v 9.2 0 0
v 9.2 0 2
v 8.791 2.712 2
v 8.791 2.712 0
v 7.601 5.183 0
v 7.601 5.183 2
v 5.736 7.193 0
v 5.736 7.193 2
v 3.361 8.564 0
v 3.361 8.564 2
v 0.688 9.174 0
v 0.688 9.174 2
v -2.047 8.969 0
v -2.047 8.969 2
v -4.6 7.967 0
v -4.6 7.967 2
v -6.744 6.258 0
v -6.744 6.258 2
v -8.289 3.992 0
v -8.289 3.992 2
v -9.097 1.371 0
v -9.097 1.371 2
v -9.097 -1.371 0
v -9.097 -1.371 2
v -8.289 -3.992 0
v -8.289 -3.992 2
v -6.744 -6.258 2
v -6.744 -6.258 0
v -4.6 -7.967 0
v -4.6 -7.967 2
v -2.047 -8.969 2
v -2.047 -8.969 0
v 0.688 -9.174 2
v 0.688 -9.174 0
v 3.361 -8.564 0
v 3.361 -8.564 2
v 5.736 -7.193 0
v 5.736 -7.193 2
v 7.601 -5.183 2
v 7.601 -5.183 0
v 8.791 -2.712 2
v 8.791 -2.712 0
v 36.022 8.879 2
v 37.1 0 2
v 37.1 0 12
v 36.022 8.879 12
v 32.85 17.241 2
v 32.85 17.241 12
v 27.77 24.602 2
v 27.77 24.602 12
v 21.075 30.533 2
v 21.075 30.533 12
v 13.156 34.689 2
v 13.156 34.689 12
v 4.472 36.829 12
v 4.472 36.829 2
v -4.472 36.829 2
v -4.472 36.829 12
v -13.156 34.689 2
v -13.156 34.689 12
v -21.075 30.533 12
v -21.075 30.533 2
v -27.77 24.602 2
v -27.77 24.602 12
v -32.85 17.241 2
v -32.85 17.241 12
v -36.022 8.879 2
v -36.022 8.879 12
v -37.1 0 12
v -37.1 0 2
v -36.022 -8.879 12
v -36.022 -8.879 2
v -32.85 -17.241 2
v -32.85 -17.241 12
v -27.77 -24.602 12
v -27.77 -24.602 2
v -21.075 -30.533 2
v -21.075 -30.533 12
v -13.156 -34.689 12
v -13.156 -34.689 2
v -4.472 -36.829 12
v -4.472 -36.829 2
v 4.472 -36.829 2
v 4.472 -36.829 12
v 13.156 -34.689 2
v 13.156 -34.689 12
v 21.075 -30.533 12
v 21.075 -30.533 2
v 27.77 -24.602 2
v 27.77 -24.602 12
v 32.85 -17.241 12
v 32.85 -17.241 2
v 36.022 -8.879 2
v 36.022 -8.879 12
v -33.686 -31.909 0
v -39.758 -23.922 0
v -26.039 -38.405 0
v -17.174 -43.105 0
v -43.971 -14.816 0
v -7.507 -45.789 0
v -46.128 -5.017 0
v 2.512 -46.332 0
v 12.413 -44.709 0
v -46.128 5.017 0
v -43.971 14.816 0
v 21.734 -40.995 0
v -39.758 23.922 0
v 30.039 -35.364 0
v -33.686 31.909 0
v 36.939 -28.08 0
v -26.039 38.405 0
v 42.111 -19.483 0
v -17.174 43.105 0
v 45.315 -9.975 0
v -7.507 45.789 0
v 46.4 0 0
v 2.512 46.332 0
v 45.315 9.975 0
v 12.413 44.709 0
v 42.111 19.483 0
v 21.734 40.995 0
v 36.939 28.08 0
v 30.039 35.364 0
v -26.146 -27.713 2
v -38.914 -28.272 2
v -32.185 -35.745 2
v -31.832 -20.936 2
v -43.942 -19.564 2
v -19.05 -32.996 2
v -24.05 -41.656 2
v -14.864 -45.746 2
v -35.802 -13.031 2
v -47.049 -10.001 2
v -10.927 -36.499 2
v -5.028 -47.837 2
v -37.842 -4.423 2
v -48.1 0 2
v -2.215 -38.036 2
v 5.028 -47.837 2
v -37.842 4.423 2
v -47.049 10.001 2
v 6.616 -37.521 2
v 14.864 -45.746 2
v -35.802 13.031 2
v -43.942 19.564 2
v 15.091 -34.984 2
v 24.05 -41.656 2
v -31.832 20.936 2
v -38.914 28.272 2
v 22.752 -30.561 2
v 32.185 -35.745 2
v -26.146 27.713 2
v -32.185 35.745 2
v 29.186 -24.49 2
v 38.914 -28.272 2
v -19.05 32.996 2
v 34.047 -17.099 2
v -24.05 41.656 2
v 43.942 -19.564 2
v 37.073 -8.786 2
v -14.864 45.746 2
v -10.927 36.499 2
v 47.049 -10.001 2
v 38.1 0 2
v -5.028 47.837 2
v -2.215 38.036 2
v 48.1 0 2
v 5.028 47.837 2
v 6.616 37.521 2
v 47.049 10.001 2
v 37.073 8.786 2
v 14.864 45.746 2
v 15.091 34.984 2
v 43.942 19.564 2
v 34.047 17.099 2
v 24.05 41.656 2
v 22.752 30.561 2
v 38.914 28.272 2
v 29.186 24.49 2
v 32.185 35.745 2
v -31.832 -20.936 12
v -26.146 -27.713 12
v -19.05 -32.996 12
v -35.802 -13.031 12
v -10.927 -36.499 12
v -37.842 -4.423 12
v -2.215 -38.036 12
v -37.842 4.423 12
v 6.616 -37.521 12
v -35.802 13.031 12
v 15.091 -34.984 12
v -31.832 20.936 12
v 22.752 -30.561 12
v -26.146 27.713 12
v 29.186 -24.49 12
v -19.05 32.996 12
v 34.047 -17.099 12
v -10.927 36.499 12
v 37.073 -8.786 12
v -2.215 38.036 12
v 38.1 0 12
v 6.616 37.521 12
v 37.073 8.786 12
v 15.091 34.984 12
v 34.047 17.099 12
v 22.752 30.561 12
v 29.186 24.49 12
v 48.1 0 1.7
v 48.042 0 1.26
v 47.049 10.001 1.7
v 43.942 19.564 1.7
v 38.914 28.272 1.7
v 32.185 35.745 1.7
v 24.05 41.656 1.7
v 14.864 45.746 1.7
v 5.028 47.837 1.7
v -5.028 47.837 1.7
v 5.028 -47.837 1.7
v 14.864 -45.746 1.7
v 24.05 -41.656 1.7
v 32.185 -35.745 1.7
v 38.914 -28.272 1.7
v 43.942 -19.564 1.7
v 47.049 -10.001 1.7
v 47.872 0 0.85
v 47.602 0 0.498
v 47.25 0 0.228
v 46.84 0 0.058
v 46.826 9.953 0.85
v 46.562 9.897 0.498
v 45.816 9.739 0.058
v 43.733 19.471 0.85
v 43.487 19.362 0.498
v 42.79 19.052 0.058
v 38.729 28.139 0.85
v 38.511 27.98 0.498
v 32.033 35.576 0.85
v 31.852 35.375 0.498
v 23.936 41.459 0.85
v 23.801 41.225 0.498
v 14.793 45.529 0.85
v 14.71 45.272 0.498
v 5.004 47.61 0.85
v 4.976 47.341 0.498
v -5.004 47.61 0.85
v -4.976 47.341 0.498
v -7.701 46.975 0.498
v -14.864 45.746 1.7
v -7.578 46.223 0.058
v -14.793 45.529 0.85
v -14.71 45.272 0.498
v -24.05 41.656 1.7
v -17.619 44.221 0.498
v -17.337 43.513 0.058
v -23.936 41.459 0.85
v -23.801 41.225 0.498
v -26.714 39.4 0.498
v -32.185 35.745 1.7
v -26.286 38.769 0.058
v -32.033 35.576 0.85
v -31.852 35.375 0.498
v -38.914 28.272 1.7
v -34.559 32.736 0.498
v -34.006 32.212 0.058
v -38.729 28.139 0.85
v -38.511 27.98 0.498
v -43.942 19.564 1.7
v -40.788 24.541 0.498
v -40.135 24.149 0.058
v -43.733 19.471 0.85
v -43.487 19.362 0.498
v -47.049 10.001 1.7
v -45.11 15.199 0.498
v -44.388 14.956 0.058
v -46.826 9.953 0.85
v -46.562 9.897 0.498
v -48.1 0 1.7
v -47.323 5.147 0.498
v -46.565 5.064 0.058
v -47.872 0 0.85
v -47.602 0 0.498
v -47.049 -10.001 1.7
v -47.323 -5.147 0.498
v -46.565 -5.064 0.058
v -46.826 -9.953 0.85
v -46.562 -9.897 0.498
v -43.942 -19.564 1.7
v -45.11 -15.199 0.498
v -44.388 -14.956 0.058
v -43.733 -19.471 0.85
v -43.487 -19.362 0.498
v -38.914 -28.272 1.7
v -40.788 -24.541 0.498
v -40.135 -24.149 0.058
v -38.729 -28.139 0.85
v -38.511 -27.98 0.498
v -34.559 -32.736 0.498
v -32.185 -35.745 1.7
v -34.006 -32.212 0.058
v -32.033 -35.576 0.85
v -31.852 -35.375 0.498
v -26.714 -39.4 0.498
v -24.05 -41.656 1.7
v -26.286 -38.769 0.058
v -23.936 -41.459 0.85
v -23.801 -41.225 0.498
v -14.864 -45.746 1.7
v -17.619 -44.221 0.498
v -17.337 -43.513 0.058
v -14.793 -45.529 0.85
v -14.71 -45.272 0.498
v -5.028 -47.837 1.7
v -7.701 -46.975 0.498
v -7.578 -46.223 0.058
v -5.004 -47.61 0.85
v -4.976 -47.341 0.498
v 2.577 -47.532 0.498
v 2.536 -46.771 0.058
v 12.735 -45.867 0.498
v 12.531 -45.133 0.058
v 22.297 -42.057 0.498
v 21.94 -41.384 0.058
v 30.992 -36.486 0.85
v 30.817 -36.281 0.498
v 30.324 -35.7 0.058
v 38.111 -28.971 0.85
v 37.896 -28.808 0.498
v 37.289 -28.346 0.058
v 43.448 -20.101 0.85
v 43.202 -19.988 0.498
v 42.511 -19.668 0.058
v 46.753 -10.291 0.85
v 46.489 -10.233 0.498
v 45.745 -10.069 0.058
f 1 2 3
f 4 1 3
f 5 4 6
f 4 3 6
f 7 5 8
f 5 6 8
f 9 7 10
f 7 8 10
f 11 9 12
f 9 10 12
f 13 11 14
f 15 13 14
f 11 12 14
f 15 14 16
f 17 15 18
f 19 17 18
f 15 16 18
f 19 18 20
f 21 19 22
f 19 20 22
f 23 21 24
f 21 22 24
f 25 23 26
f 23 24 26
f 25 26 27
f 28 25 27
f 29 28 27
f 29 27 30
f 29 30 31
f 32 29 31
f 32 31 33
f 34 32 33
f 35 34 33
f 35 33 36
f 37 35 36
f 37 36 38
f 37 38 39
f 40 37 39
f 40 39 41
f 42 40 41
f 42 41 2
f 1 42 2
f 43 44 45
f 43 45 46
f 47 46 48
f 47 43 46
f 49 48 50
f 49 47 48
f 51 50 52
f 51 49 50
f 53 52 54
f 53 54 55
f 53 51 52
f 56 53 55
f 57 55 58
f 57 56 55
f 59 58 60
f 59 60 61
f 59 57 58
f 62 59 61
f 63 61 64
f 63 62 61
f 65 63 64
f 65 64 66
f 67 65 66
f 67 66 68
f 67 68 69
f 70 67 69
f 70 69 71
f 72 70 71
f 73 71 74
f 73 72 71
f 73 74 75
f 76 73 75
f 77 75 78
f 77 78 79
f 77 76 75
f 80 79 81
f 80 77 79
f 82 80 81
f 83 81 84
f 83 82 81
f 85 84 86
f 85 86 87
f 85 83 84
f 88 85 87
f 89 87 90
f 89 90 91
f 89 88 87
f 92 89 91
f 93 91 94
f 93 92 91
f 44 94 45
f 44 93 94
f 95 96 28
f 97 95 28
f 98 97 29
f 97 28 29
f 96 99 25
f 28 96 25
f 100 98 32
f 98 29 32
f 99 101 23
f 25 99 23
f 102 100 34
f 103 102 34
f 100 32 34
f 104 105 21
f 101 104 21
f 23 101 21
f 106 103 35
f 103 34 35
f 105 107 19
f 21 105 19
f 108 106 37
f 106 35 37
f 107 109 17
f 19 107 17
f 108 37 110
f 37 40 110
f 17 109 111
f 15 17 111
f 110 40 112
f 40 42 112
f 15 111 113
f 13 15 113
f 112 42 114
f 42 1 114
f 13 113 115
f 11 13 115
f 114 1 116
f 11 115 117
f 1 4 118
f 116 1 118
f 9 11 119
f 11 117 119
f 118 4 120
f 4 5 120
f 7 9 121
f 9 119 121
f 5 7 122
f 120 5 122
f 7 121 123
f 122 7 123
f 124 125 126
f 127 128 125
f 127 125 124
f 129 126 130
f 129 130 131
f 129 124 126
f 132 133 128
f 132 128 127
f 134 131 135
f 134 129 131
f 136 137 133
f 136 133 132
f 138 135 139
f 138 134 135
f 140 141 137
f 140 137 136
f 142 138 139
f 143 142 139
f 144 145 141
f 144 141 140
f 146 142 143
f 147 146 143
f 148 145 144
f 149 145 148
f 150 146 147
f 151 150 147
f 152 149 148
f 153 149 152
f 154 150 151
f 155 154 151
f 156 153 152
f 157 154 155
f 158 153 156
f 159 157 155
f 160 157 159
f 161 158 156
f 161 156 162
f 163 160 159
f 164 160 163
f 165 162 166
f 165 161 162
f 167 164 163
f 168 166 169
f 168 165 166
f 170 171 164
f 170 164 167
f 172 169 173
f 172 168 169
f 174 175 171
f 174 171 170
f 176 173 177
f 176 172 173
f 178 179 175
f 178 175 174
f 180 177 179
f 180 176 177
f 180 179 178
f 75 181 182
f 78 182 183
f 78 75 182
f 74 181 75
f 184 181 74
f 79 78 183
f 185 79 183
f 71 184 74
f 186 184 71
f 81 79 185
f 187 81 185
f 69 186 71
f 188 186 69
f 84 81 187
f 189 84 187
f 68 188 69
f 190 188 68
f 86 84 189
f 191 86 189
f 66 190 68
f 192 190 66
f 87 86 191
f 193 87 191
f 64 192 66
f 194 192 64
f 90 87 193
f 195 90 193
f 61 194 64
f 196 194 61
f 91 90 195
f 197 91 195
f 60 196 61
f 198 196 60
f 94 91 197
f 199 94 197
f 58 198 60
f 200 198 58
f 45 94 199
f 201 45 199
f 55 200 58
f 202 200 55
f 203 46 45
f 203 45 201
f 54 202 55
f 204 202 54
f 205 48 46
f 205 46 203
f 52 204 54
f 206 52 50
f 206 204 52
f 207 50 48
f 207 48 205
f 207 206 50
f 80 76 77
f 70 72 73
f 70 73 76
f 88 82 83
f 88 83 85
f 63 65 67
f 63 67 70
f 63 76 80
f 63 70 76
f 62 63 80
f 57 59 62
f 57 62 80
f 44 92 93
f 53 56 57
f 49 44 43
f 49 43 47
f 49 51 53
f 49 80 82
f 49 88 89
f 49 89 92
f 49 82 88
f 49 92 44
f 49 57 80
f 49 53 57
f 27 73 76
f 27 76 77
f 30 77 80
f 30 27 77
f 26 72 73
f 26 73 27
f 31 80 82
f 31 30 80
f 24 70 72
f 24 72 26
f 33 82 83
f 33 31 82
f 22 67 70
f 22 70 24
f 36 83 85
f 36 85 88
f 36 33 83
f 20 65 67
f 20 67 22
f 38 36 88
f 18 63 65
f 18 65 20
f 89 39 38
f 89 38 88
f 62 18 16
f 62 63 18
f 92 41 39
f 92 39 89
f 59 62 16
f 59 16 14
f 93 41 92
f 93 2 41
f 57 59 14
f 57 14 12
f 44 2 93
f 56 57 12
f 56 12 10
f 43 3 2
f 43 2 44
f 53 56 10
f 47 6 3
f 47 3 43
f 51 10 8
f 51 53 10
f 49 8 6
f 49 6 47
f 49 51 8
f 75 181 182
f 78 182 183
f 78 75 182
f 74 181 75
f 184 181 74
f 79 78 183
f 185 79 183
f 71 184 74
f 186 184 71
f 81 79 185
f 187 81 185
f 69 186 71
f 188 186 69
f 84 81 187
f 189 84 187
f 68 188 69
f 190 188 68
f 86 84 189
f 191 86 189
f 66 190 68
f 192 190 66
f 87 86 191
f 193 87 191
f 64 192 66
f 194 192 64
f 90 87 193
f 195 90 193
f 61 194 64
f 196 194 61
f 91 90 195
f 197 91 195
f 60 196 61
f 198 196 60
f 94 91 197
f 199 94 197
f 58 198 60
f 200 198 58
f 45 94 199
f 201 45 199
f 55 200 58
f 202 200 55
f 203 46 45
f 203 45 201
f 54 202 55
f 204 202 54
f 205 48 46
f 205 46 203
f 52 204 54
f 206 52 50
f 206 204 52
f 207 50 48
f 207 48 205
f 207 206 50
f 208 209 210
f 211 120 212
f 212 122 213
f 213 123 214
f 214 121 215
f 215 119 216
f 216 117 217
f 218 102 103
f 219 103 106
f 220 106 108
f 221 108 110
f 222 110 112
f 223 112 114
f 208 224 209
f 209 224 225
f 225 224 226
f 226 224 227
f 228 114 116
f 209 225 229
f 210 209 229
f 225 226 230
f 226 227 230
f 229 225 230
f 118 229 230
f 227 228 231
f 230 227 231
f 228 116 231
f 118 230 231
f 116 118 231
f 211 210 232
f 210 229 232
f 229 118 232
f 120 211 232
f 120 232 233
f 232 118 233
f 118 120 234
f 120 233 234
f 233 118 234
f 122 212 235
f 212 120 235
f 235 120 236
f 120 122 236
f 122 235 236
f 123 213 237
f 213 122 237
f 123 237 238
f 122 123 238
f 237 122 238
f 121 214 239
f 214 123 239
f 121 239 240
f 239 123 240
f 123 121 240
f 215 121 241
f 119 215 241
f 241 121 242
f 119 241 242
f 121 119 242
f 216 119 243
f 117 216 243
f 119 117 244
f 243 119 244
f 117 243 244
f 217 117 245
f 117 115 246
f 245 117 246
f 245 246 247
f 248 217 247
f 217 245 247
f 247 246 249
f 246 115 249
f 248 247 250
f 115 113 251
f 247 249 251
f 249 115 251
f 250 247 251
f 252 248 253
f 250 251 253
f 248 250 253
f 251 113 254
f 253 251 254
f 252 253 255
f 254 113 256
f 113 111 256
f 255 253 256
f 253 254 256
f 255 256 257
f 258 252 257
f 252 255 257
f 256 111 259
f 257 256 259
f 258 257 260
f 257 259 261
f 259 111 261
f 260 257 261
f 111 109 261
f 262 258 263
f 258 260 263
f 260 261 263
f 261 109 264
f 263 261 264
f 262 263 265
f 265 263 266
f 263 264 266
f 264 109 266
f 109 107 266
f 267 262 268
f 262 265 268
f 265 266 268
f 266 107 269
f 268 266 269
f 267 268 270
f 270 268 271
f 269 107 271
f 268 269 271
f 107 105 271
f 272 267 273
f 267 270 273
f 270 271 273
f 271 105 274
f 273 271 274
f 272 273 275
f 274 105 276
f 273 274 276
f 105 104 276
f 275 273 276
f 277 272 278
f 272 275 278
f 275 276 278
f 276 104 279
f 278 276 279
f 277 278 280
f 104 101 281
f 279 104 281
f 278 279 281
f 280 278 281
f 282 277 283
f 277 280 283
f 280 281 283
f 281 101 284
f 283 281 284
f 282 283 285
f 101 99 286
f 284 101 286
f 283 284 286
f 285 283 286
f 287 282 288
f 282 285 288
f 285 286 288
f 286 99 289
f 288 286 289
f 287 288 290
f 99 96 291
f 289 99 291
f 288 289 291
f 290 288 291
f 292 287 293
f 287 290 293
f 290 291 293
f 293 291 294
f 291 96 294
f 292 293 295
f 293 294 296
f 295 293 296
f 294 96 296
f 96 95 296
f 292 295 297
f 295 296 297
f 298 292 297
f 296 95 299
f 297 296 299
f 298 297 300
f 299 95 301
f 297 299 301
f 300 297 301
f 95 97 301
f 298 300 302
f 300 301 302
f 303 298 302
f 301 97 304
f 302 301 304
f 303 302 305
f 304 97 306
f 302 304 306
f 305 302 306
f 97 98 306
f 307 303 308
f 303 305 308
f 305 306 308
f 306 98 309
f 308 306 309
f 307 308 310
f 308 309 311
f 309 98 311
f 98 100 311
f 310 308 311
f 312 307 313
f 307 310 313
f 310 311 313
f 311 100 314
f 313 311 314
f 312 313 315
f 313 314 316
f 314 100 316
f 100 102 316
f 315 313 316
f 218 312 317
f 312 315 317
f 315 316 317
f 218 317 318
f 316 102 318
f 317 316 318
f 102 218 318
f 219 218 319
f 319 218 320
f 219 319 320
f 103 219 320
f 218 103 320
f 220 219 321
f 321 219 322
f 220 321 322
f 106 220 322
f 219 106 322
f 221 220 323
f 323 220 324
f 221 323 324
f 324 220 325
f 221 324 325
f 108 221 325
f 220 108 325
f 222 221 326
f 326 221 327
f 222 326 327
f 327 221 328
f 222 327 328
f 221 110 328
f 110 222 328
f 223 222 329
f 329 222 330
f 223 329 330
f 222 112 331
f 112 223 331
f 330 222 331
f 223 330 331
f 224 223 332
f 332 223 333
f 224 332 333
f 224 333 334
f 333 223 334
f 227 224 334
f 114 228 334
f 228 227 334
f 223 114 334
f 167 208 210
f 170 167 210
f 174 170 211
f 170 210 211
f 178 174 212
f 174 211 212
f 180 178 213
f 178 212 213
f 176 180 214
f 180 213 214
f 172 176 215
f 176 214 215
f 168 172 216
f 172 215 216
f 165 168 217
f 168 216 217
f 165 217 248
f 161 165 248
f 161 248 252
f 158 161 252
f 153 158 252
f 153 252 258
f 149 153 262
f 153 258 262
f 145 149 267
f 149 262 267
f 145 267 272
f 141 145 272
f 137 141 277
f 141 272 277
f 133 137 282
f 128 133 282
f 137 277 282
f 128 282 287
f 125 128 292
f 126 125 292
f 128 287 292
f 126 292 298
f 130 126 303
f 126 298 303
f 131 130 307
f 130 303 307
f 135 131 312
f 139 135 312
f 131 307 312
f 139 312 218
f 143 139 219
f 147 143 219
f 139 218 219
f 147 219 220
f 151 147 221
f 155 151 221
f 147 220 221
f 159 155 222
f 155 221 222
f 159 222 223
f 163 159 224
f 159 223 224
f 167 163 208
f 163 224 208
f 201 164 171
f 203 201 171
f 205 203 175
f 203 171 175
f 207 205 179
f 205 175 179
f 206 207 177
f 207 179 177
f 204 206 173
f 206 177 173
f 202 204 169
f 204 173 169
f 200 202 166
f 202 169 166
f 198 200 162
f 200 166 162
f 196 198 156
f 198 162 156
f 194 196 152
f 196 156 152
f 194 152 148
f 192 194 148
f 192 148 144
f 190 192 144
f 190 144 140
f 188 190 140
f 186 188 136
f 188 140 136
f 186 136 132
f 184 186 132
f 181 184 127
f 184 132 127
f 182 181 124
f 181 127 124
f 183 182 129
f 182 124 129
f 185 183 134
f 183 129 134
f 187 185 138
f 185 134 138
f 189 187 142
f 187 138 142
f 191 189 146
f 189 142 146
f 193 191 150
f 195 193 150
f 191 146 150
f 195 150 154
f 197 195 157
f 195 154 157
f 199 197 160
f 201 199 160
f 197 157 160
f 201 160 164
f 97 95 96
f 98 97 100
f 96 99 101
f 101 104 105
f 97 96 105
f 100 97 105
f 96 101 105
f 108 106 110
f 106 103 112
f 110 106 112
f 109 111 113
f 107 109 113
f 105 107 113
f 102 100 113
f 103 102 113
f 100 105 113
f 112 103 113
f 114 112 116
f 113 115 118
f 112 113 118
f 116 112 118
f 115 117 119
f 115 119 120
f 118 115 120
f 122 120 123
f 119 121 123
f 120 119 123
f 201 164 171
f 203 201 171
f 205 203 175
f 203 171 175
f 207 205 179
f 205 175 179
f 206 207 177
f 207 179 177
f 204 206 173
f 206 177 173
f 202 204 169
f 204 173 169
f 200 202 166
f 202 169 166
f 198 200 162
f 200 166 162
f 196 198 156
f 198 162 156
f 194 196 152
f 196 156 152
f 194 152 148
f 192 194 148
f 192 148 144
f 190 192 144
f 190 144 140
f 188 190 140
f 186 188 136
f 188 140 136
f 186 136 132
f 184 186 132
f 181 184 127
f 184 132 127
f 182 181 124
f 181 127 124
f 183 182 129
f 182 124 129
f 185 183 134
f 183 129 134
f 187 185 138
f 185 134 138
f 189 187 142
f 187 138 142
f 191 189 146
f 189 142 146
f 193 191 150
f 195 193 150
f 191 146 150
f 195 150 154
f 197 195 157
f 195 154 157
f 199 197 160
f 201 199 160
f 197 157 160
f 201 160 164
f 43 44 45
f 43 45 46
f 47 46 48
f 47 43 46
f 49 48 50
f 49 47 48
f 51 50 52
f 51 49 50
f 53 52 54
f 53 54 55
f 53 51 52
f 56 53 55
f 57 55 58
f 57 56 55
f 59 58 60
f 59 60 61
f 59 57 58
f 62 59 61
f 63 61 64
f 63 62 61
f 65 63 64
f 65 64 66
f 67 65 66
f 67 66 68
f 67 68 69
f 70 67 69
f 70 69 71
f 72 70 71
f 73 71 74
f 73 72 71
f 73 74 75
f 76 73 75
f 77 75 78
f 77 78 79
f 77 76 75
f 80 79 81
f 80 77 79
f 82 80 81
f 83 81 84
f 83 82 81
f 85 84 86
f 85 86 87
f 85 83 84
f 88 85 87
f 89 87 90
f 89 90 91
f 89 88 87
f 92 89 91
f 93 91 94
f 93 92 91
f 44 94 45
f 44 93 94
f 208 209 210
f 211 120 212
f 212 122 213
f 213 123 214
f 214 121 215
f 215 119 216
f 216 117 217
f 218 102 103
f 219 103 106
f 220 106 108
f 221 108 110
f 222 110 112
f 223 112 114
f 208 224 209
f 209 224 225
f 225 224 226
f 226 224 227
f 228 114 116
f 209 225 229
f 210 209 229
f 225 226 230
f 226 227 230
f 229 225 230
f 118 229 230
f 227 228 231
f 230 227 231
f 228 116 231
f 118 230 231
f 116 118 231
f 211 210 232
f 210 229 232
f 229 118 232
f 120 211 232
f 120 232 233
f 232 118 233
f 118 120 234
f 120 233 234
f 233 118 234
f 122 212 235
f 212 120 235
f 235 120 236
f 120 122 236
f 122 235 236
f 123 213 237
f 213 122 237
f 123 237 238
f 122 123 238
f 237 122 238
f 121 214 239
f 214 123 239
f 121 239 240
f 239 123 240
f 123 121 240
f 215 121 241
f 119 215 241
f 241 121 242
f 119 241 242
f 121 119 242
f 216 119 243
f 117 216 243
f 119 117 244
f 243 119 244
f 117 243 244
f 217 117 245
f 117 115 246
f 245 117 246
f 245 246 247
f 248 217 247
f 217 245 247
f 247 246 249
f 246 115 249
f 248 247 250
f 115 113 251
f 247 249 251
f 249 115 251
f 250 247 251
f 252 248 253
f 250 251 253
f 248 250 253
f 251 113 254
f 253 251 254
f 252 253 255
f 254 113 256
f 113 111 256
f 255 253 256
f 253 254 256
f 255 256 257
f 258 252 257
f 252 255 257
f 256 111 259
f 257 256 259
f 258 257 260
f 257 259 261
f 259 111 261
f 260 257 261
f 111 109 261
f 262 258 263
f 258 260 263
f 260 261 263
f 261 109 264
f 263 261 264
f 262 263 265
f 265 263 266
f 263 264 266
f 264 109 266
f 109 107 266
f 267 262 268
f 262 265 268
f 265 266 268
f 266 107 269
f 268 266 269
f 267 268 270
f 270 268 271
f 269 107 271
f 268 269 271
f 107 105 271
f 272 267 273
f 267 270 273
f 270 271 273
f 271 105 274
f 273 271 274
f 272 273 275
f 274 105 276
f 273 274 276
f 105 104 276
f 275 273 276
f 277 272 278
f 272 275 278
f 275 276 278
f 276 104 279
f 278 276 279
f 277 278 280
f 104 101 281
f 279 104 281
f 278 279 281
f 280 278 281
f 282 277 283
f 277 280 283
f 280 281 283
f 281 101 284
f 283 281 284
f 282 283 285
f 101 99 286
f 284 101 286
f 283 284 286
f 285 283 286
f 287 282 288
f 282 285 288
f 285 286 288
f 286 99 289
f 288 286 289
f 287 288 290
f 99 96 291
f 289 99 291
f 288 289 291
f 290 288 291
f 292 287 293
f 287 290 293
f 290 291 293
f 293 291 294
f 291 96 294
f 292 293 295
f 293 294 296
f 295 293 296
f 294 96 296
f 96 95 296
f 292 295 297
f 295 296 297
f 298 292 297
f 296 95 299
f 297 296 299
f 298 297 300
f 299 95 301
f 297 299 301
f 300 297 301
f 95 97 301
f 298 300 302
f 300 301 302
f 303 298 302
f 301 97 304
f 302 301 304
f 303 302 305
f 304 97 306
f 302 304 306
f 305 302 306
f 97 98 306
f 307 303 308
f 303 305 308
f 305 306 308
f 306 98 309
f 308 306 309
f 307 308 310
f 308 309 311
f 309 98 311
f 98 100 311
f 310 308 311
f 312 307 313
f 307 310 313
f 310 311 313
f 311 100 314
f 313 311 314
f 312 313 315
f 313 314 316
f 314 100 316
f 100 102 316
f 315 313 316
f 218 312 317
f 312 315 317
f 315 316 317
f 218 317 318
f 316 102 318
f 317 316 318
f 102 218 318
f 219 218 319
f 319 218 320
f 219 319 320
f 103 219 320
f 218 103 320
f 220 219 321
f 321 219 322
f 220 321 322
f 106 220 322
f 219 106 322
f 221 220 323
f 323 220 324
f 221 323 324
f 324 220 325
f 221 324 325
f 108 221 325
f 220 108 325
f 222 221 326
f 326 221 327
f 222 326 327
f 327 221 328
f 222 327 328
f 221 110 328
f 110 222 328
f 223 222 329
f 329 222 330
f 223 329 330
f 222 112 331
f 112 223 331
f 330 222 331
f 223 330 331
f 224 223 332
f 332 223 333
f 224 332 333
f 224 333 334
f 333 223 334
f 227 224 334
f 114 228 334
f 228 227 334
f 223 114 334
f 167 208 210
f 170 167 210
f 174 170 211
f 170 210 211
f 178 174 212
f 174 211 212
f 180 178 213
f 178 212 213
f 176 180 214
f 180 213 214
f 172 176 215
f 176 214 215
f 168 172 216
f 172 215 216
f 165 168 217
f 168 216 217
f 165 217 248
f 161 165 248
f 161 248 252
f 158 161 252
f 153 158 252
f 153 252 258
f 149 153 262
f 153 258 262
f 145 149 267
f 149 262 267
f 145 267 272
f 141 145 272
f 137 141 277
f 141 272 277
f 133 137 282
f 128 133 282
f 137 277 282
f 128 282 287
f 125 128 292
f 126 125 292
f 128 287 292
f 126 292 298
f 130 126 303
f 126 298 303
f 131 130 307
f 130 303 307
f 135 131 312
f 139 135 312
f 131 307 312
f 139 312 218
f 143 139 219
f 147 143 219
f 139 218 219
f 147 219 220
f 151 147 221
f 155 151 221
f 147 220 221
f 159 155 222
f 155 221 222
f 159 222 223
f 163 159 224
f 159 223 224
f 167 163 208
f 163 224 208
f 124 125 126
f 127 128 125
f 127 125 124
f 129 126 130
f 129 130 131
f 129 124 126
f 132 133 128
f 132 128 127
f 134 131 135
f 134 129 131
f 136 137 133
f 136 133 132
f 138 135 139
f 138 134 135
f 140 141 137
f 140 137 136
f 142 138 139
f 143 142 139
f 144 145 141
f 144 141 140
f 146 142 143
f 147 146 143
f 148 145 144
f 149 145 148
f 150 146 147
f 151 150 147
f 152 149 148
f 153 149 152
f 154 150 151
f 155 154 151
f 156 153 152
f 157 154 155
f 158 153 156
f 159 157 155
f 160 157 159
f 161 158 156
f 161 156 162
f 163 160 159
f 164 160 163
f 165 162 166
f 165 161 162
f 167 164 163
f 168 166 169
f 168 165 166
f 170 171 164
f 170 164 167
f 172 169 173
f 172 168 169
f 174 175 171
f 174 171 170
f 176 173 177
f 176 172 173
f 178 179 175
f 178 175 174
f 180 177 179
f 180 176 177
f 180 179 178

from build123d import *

# Parameters (mm, degrees)
SKETCH_R      = 48.1
PAD_DEPTH     = 2
FILLET_R      = 1.7
SKETCH001_R   = 38.1
SKETCH001_R_2 = 37.1
PAD001_DEPTH  = 10
SKETCH002_R   = 48.1
PAD002_DEPTH  = 2
FILLET001_R   = 1.7
SKETCH003_R   = 38.1
SKETCH003_R_2 = 37.1
PAD003_DEPTH  = 10
SKETCH004_R   = 9.2
POCKET_DEPTH  = 2.001


with BuildPart() as capbody:
    # Sketch → Pad (new body)
    with BuildSketch(Plane.XY):
        Circle(SKETCH_R)
    extrude(amount=PAD_DEPTH)

    # Fillet
    fillet_edges = [capbody.edges().sort_by_distance(p)[0] for p in [
        (-48.1, 0, 0),
    ]]
    fillet(fillet_edges, radius=FILLET_R)

    # Sketch001 (on Face3 of Fillet) → Pad001 (join)
    with BuildSketch(Plane.XY.offset(2)):
        Circle(SKETCH001_R)
        Circle(SKETCH001_R_2, mode=Mode.SUBTRACT)
    extrude(amount=PAD001_DEPTH)


with BuildPart() as capbody001:
    # Sketch002 → Pad002 (new body)
    with BuildSketch(Plane.XY):
        Circle(SKETCH002_R)
    extrude(amount=PAD002_DEPTH)

    # Fillet001
    fillet001_edges = [capbody001.edges().sort_by_distance(p)[0] for p in [
        (-48.1, 0, 0),
    ]]
    fillet(fillet001_edges, radius=FILLET001_R)

    # Sketch003 (on Face3 of Fillet001) → Pad003 (join)
    with BuildSketch(Plane.XY.offset(2)):
        Circle(SKETCH003_R)
        Circle(SKETCH003_R_2, mode=Mode.SUBTRACT)
    extrude(amount=PAD003_DEPTH)

    # Sketch004 (on Face8 of Pad003) → Pocket (cut, through all)
    with BuildSketch(Plane.XY.offset(2)):
        Circle(SKETCH004_R)
    extrude(amount=-POCKET_DEPTH, mode=Mode.SUBTRACT)


solid = Compound([capbody.part, capbody001.part])
